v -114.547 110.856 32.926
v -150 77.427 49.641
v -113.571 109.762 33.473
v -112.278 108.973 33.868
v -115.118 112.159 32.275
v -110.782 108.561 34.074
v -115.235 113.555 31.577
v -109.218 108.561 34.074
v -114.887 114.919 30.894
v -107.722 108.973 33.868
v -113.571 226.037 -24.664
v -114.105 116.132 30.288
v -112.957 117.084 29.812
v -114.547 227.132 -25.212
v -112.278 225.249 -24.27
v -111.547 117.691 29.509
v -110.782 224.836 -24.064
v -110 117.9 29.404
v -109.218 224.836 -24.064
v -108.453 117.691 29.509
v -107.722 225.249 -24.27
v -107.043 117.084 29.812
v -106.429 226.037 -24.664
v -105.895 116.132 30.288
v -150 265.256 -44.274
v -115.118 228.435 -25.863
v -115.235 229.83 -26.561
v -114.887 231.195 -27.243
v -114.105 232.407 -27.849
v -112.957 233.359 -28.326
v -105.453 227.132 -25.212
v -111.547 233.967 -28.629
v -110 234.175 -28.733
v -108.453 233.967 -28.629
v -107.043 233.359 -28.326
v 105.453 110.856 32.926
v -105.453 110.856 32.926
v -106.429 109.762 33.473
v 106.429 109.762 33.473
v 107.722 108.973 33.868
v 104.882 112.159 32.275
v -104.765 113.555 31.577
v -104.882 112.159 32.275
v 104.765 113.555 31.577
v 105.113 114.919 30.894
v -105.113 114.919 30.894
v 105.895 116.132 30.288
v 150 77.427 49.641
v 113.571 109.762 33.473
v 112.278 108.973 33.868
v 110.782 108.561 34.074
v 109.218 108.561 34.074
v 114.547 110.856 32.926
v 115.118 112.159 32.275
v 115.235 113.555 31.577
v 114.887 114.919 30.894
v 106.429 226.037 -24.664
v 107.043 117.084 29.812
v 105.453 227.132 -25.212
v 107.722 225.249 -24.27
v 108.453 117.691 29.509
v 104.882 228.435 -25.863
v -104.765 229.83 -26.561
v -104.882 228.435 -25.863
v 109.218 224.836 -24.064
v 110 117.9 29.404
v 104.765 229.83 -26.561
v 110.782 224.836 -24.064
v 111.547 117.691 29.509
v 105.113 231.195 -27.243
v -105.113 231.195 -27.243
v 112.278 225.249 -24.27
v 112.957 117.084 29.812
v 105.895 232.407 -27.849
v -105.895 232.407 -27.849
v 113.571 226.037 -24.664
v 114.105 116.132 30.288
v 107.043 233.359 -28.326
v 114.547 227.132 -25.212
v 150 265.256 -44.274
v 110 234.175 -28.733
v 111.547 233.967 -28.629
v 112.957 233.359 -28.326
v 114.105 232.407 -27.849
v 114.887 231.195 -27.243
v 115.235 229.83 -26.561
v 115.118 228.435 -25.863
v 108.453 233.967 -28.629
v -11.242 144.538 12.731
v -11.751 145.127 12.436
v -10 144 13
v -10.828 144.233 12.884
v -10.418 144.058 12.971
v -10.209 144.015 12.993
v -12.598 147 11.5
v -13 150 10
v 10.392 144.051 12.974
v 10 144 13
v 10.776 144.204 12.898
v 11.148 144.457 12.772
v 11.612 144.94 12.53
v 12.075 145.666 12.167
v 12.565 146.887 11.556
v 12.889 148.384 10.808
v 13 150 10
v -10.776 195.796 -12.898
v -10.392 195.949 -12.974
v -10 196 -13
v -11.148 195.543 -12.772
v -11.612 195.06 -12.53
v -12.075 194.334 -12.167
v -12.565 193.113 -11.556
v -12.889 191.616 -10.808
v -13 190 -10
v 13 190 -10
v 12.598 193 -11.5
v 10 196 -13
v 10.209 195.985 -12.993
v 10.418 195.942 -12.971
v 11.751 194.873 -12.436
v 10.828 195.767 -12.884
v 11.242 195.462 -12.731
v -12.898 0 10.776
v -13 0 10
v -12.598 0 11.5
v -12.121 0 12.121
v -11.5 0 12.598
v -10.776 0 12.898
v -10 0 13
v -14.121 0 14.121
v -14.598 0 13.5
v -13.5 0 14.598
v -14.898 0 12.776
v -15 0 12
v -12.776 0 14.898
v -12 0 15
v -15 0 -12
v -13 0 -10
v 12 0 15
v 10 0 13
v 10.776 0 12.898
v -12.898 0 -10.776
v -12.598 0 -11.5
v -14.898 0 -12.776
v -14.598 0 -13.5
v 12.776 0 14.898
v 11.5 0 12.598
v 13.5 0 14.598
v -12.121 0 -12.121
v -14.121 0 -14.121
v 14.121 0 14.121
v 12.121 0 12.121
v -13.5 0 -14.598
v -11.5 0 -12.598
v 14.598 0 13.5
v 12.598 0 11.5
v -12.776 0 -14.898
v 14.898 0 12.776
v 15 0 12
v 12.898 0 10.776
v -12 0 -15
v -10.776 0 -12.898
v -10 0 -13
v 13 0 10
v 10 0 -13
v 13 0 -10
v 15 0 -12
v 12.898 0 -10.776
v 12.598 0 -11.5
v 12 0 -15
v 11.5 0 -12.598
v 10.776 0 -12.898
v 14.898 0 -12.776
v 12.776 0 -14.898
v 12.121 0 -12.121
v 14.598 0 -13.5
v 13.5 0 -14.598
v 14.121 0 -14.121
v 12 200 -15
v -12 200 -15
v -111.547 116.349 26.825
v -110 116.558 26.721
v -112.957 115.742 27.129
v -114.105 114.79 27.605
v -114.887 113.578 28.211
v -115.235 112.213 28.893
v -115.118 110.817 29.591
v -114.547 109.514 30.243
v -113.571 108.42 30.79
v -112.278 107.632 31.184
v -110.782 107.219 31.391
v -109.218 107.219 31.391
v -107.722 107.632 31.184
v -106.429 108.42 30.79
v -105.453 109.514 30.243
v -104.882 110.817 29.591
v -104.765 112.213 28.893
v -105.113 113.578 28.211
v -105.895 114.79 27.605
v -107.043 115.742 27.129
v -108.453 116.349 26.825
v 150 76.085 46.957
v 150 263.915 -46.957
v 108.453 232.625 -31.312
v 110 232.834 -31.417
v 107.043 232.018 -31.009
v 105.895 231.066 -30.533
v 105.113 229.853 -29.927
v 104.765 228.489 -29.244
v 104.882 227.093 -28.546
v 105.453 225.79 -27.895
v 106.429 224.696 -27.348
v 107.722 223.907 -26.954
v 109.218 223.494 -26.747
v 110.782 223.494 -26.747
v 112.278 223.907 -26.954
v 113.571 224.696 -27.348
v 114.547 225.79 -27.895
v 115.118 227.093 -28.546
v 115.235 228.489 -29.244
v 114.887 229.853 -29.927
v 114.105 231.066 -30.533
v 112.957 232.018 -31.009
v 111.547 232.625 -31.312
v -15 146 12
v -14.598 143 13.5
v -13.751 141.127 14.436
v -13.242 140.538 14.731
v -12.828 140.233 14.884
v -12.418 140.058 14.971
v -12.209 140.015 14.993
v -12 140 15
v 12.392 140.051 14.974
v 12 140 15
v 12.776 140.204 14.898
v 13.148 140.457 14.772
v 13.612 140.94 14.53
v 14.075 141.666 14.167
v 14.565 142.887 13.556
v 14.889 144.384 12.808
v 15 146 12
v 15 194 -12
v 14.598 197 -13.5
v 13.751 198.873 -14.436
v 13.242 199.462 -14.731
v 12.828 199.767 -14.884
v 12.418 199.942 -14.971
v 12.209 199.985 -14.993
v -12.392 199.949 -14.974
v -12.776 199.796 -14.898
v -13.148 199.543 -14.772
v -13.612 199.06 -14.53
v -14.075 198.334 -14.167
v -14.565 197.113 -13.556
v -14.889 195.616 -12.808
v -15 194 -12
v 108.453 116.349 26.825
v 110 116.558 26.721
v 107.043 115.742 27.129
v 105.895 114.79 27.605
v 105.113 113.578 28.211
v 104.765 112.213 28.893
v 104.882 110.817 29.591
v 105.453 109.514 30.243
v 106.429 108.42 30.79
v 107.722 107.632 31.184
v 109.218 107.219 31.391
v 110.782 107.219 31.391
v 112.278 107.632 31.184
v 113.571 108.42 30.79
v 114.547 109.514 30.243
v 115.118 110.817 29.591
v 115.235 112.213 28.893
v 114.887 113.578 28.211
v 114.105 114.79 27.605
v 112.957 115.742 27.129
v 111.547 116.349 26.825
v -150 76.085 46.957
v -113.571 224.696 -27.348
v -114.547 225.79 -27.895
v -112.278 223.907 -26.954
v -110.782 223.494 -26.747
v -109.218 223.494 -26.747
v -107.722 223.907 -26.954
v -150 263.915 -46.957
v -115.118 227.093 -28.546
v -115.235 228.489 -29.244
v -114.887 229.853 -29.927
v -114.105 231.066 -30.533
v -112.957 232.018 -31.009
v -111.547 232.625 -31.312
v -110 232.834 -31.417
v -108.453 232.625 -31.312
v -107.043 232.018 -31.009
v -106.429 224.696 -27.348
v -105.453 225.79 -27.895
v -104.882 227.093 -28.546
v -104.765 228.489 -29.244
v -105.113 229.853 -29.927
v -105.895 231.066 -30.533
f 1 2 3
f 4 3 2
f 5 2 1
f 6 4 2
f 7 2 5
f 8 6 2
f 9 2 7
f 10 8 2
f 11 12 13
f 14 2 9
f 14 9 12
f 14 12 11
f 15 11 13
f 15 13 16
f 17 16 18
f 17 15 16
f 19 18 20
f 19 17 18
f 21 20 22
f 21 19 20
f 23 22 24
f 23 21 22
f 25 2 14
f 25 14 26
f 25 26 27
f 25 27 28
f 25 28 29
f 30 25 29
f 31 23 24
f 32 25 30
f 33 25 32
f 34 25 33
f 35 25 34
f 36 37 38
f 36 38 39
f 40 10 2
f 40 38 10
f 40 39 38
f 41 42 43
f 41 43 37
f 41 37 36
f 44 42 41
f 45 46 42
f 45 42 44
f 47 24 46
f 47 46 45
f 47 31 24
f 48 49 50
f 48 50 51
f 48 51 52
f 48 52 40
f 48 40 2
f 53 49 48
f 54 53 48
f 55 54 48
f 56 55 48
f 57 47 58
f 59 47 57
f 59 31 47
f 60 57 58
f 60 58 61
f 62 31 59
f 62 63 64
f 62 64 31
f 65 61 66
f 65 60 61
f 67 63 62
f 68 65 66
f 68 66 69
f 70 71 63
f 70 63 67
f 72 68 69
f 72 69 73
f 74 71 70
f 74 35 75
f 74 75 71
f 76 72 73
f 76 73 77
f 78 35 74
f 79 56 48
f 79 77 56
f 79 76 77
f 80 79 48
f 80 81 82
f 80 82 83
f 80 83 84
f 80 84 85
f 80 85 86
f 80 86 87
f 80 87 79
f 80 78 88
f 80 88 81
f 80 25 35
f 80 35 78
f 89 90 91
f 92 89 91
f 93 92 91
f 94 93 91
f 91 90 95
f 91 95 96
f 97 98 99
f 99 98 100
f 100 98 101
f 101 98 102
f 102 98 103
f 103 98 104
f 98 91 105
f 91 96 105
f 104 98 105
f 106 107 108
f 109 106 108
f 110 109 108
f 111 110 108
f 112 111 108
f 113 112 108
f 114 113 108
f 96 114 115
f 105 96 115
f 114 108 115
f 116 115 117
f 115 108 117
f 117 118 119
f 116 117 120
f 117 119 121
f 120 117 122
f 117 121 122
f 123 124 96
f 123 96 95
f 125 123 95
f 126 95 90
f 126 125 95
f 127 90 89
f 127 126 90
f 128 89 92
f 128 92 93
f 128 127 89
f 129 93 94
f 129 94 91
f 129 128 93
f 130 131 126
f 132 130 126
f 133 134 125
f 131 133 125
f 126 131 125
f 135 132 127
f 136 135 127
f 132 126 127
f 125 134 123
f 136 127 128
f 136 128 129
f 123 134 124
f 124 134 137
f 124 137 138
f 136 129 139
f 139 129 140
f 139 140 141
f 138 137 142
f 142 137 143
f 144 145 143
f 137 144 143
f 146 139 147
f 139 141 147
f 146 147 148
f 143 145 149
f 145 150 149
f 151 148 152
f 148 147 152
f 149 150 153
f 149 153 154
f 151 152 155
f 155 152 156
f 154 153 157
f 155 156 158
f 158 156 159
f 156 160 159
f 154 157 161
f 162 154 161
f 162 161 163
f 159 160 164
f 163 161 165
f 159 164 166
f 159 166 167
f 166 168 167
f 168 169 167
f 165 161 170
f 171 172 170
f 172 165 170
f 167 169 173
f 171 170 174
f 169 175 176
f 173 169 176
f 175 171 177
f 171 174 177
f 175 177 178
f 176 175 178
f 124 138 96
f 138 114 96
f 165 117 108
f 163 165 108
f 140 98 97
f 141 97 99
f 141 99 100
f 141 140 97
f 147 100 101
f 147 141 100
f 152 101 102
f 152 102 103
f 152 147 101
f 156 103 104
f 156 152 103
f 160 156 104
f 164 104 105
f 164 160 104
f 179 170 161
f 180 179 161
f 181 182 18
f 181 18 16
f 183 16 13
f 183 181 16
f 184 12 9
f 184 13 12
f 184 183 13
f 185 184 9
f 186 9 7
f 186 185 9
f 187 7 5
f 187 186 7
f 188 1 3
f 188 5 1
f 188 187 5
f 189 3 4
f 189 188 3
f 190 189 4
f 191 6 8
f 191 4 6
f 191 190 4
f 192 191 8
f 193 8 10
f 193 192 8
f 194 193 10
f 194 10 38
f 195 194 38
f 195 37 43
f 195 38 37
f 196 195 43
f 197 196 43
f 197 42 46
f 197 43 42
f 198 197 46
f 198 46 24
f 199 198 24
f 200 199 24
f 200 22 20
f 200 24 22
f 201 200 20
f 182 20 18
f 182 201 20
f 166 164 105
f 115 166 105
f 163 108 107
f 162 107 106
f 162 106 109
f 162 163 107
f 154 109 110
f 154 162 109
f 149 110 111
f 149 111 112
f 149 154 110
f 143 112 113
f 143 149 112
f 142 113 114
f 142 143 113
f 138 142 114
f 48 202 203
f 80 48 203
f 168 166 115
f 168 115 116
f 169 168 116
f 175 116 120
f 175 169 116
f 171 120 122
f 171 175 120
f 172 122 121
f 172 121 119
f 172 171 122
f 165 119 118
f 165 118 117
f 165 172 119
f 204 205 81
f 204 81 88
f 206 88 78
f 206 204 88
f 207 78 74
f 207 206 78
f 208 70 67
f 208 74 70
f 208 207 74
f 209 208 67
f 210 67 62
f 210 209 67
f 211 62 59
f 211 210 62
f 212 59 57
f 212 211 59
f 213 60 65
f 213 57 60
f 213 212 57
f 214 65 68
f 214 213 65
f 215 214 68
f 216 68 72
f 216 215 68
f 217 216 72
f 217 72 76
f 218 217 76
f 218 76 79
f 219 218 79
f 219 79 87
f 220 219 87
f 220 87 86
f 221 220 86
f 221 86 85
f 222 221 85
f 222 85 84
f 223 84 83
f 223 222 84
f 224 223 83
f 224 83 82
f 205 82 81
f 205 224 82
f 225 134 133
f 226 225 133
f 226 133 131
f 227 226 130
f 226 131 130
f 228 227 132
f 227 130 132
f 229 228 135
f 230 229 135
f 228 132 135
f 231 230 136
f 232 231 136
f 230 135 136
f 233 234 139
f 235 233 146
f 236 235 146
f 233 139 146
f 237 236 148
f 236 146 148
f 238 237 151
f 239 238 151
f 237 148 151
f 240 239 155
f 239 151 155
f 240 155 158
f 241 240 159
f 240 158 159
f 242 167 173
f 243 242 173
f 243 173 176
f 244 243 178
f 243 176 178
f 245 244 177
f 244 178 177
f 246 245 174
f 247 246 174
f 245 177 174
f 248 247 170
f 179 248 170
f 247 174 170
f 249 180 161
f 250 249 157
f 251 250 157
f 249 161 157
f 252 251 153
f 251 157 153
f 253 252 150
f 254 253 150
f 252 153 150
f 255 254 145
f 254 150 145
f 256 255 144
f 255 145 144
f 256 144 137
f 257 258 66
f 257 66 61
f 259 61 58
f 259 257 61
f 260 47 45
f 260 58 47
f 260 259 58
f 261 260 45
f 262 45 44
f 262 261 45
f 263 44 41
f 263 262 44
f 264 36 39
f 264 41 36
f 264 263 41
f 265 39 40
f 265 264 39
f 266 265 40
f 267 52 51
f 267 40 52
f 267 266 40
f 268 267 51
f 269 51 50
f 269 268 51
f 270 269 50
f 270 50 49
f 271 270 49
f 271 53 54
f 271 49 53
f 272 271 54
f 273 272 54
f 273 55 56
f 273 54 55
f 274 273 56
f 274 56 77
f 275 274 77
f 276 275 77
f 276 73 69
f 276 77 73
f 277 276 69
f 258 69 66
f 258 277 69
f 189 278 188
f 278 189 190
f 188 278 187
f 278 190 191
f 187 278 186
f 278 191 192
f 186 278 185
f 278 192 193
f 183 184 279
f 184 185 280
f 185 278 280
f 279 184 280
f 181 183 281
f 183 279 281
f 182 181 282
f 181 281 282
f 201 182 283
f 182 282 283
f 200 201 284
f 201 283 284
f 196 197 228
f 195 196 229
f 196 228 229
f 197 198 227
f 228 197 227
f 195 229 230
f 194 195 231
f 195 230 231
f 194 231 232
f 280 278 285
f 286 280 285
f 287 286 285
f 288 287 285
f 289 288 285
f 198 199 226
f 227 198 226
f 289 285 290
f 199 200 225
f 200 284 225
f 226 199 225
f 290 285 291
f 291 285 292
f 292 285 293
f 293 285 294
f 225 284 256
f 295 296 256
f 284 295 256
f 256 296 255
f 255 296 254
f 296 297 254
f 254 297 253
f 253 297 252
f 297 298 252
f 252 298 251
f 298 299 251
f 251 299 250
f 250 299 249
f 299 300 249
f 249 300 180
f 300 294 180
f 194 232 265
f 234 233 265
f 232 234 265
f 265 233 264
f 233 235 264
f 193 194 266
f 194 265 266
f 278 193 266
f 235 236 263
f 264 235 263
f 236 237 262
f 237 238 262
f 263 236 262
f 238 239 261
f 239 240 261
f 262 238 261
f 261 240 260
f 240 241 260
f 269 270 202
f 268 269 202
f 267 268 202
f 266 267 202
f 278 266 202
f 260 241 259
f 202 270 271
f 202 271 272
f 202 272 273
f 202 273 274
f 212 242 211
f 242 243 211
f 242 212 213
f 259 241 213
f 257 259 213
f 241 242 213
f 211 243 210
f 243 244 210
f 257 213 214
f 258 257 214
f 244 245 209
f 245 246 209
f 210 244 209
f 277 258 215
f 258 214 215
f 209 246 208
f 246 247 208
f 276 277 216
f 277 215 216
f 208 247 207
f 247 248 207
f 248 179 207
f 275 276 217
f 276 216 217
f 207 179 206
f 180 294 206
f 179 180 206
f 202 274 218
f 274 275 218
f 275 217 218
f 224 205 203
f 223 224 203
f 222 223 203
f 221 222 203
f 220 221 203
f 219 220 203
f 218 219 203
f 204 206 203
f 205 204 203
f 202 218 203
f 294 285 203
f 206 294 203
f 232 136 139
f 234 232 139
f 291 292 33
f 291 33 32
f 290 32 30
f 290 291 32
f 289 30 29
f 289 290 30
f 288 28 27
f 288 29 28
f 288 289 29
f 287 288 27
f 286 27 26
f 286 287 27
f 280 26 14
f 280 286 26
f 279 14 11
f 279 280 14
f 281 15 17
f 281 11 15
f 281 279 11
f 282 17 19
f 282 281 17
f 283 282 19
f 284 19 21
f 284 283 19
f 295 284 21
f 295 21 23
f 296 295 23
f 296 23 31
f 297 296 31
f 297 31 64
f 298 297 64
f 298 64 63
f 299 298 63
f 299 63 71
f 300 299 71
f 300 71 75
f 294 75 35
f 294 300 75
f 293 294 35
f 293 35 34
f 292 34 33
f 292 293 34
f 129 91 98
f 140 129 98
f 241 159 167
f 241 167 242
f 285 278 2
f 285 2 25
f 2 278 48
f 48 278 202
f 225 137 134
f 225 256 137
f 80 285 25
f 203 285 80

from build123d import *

# Parameters (mm, degrees)
BOSS_EXTRU_1_DEPTH           = 200
ENL_V_MAT_EXTRU_1_DEPTH      = 100
ESQUISSE3_W                  = 300
ESQUISSE3_H                  = 210
BOSS_EXTRU_2_DEPTH           = 3
ENL_V_MAT_EXTRU_2_DEPTH      = 299.654946406
ENL_V_MAT_EXTRU_2_DEPTH_BACK = 299.654946406
ESQUISSE4_R                  = 5.25


with BuildPart() as part:
    # Esquisse1 → Boss.-Extru.1 (new body)
    with BuildSketch(Plane(origin=(0, 0, 0), x_dir=(1, 0, 0), z_dir=(0, 1, 0))):
        with BuildLine():
            Line((-12, -15), (12, -15))
            ThreePointArc((12, -15), (14.121320344, -14.121320344), (15, -12))
            Line((15, -12), (15, 12))
            ThreePointArc((15, 12), (14.121320344, 14.121320344), (12, 15))
            Line((12, 15), (-12, 15))
            ThreePointArc((-12, 15), (-14.121320344, 14.121320344), (-15, 12))
            Line((-15, 12), (-15, -12))
            ThreePointArc((-15, -12), (-14.121320344, -14.121320344), (-12, -15))
        make_face()
        with BuildLine():
            Line((-10, -13), (10, -13))
            ThreePointArc((10, -13), (12.121320344, -12.121320344), (13, -10))
            Line((13, -10), (13, 10))
            ThreePointArc((13, 10), (12.121320344, 12.121320344), (10, 13))
            Line((10, 13), (-10, 13))
            ThreePointArc((-10, 13), (-12.121320344, 12.121320344), (-13, 10))
            Line((-13, 10), (-13, -10))
            ThreePointArc((-13, -10), (-12.121320344, -12.121320344), (-10, -13))
        make_face(mode=Mode.SUBTRACT)
    extrude(amount=BOSS_EXTRU_1_DEPTH)

    # Esquisse2 → Enlèv. mat.-Extru.1 (cut)
    with BuildSketch(Plane(origin=(15, 0, 0), x_dir=(0, 0, -1), z_dir=(1, 0, 0))):
        Polygon((15, 200), (-15, 140), (-15, 200), align=None)
    extrude(amount=-ENL_V_MAT_EXTRU_1_DEPTH, mode=Mode.SUBTRACT)

    # Esquisse3 → Boss.-Extru.2 (add)
    with BuildSketch(Plane(origin=(0, 34, 68), x_dir=(1, 0, 0), z_dir=(0, 0.447213595499958, 0.8944271909999159))):
        with Locations((0, 152.05262247)):
            Rectangle(ESQUISSE3_W, ESQUISSE3_H)
    extrude(amount=BOSS_EXTRU_2_DEPTH)

    # Esquisse4 → Enlèv. mat.-Extru.2 (cut, two sides: drawn at the far end of the back side and taken through both)
    with BuildSketch(Plane(origin=(0, 34, 68), x_dir=(1, 0, 0), z_dir=(0, 0.447213595499958, 0.8944271909999159)).offset(-ENL_V_MAT_EXTRU_2_DEPTH_BACK)):
        with Locations(Location((-110, 217.05262247, 0), (0, 0, 90))):
            Circle(ESQUISSE4_R)
        with Locations(Location((110, 217.05262247, 0), (0, 0, 90))):
            Circle(ESQUISSE4_R)
        with Locations(Location((110, 87.05262247, 0), (0, 0, 90))):
            Circle(ESQUISSE4_R)
        with Locations(Location((-110, 87.05262247, 0), (0, 0, 90))):
            Circle(ESQUISSE4_R)
    extrude(amount=ENL_V_MAT_EXTRU_2_DEPTH + ENL_V_MAT_EXTRU_2_DEPTH_BACK, mode=Mode.SUBTRACT)


solid = part.part
